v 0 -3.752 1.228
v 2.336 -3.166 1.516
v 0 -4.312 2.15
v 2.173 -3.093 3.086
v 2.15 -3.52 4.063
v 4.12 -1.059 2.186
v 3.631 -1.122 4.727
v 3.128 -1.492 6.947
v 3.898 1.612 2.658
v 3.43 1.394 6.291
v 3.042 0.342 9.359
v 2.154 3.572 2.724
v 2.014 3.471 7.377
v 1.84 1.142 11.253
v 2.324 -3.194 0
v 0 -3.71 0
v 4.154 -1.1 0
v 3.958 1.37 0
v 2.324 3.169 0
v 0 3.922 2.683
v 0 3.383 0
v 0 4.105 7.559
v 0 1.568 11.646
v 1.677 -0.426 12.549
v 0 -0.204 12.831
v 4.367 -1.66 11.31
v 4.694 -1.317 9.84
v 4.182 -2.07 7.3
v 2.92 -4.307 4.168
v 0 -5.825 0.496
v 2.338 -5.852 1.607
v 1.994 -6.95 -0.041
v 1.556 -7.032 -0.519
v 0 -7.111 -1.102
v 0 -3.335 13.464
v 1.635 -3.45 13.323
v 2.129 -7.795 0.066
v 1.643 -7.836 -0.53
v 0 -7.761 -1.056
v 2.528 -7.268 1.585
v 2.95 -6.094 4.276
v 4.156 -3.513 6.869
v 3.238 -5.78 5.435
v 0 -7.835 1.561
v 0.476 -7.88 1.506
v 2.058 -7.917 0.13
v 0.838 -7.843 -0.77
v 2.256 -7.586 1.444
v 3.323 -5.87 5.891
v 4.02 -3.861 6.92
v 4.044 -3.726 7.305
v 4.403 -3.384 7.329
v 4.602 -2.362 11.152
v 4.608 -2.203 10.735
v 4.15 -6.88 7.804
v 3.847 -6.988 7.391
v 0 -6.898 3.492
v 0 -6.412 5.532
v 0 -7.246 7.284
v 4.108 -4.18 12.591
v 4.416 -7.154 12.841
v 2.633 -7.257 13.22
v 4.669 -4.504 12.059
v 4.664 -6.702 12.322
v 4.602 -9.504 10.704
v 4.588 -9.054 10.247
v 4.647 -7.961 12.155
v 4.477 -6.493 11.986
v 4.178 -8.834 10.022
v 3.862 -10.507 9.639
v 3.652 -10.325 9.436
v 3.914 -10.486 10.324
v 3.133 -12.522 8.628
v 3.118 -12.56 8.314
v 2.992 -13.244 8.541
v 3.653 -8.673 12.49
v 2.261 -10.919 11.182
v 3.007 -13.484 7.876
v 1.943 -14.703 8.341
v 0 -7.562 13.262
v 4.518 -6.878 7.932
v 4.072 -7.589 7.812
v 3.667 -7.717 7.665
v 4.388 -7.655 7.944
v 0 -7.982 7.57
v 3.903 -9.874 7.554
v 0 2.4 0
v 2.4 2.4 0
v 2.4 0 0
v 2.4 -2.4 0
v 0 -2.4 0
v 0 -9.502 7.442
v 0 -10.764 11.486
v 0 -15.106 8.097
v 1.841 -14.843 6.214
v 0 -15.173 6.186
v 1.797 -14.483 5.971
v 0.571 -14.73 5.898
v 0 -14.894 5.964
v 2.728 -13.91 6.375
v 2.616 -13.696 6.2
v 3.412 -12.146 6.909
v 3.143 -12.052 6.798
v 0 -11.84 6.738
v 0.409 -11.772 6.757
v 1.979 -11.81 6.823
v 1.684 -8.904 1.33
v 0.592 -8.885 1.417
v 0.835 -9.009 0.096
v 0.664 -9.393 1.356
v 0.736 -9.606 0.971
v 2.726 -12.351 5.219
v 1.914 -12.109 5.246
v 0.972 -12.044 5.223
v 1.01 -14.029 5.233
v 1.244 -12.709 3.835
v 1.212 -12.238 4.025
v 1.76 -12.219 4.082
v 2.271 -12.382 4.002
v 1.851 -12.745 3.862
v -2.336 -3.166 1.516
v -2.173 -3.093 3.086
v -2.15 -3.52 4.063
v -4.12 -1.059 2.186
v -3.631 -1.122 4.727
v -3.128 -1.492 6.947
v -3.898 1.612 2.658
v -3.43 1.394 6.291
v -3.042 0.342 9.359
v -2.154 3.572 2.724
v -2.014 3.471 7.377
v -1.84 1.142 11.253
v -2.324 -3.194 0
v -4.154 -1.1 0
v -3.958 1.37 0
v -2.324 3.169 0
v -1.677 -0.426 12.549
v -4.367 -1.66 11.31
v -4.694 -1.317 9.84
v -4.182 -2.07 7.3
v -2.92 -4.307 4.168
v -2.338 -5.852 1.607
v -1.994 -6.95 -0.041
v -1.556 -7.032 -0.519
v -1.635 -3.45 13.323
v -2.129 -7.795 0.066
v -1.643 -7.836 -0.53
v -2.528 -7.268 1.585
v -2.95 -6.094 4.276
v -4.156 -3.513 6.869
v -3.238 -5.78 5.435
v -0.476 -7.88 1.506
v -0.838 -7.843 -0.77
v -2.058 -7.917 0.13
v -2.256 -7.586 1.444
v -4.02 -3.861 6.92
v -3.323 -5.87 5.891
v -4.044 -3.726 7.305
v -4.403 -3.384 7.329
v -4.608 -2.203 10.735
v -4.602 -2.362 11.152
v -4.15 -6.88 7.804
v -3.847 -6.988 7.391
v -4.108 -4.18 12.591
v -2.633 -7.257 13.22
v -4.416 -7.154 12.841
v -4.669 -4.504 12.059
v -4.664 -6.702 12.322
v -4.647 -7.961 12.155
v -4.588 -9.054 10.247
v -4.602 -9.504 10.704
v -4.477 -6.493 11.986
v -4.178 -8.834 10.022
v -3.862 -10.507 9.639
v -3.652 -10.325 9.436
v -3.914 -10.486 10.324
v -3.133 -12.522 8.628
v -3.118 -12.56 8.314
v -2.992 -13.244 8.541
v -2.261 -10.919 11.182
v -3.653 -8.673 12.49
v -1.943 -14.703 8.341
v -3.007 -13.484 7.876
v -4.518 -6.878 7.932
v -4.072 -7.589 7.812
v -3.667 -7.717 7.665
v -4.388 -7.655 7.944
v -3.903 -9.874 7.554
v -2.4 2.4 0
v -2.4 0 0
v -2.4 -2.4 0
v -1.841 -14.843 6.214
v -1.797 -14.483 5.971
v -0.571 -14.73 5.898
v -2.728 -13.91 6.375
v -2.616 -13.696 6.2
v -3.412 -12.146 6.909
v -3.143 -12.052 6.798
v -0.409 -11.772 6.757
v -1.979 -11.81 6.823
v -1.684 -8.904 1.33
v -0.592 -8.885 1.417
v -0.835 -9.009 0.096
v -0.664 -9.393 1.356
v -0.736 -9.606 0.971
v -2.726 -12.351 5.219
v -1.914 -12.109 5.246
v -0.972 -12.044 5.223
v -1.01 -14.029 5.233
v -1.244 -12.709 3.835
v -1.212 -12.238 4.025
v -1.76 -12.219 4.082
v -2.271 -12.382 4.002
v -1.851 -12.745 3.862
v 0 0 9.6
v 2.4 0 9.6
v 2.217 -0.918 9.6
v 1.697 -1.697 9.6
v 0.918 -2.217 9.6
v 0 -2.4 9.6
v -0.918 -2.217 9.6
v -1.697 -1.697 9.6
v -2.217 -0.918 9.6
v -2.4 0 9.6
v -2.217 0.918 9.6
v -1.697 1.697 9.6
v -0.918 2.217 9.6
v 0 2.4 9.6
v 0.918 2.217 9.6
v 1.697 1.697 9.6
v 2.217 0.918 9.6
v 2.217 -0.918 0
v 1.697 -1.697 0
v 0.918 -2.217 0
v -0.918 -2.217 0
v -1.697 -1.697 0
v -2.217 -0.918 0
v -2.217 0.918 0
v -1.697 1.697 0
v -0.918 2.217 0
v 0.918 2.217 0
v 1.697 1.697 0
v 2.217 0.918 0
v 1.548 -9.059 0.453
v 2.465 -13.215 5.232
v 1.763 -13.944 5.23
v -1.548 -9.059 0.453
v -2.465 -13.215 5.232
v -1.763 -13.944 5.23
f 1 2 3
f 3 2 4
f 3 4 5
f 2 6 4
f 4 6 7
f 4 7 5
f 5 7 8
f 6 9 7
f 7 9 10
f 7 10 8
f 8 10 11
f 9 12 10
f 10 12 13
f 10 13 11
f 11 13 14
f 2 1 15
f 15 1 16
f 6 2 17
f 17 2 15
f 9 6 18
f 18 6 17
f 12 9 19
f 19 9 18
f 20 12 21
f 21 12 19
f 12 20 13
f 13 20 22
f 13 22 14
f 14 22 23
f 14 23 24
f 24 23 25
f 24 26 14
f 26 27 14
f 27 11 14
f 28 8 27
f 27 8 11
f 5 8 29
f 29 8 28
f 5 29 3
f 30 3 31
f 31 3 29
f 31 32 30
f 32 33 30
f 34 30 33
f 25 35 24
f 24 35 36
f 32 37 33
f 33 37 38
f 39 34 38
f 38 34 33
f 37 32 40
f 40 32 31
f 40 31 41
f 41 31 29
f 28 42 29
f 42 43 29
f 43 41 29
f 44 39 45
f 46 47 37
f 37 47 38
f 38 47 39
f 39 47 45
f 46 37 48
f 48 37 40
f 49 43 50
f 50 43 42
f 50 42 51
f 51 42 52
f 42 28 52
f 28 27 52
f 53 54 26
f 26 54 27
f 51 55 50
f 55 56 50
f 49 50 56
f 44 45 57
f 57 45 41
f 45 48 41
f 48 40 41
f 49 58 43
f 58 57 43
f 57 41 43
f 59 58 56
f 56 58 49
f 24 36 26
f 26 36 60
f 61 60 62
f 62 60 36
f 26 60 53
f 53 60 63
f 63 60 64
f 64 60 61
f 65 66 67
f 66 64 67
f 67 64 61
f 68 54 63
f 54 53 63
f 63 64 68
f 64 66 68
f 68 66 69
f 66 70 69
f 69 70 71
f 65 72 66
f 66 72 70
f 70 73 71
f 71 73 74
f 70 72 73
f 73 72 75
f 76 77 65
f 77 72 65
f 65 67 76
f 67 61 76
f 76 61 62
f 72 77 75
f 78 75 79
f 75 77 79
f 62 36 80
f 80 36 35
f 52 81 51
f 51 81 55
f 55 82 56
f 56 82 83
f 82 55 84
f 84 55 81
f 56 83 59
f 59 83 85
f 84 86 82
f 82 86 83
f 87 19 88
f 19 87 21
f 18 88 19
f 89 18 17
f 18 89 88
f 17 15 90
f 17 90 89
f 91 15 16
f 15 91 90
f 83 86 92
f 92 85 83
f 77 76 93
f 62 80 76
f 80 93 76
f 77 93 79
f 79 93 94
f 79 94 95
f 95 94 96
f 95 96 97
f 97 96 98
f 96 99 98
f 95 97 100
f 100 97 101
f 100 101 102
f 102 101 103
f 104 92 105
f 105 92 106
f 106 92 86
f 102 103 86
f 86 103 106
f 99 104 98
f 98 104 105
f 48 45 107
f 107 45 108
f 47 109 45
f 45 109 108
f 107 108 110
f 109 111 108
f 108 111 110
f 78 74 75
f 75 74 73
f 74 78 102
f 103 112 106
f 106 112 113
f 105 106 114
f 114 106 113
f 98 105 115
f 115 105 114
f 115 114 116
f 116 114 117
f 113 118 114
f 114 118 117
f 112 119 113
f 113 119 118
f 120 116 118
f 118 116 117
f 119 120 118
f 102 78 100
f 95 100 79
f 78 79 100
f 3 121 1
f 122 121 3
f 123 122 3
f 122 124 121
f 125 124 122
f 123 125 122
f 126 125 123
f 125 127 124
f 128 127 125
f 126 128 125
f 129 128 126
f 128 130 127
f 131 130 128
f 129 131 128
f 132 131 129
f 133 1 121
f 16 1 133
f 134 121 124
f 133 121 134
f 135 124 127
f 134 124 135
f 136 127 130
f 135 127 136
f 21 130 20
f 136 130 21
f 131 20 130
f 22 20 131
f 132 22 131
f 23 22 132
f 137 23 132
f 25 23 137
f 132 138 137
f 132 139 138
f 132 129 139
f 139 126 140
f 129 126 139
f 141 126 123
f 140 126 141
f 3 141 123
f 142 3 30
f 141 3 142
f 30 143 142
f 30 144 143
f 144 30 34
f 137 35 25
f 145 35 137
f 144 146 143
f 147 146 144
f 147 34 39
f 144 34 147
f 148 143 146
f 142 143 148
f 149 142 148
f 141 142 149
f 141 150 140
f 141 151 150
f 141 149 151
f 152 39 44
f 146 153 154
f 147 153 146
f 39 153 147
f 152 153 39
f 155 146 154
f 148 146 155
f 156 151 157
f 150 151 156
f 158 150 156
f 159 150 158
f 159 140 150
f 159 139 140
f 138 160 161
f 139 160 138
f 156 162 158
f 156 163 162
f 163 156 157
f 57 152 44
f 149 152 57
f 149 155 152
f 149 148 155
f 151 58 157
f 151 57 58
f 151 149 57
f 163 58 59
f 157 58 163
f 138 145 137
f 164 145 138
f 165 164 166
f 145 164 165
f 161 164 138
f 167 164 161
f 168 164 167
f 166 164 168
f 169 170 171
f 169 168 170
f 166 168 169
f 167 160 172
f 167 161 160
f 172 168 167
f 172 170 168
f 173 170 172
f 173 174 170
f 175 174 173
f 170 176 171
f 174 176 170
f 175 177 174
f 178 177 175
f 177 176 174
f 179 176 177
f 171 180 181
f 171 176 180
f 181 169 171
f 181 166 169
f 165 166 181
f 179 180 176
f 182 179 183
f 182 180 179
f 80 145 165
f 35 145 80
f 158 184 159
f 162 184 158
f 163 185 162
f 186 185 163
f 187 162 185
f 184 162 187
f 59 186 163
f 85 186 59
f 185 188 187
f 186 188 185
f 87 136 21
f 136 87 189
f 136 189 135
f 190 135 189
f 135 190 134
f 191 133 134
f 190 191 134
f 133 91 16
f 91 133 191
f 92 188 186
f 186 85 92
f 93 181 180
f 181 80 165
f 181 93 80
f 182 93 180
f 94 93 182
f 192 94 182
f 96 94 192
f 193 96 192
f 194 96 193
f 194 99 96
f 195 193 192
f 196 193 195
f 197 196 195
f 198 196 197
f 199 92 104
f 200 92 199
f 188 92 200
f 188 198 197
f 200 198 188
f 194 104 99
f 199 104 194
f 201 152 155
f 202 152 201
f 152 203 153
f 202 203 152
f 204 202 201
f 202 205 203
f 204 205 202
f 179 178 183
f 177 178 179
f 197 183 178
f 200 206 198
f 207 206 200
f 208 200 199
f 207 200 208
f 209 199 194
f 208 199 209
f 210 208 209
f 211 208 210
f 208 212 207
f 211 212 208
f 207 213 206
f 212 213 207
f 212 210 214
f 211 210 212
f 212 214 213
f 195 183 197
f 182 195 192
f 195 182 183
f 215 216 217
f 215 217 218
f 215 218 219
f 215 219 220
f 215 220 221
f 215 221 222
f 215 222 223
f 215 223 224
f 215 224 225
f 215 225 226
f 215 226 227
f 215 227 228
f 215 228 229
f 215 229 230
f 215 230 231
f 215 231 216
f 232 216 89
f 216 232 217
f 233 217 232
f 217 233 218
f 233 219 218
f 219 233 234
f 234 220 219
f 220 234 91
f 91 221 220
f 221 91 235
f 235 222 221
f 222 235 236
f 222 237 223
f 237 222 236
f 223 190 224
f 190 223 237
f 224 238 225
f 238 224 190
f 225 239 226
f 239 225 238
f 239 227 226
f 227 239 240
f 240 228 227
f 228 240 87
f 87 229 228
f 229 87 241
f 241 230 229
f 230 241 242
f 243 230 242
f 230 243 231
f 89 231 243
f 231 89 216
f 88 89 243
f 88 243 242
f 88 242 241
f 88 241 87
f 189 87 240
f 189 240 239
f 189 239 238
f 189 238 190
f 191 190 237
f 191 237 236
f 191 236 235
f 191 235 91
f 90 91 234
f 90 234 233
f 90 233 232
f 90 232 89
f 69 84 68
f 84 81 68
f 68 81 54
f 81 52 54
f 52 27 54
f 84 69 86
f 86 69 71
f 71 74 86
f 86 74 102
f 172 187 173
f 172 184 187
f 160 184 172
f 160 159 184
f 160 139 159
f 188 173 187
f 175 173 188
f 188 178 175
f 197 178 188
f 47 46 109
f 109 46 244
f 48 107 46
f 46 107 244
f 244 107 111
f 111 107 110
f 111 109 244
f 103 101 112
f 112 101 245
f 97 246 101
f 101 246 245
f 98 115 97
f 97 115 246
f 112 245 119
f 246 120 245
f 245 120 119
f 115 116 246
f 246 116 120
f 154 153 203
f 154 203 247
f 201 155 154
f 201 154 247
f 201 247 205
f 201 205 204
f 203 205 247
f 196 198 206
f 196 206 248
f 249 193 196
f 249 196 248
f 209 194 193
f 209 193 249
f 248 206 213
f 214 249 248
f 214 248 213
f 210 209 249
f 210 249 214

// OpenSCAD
use <../lib.scad>
use <s/18955s00.scad>
use <s/18955s02.scad>
use <s/18955s03.scad>
function ldraw_lib__18955() = [
// 0 Minifig Head Snake with Open Mouth
// 0 Name: 18955.dat
// 0 Author: Jeff Jones [notmaster]
// 0 !LDRAW_ORG Part UPDATE 2025-11
// 0 !LICENSE Licensed under CC BY 4.0 : see CAreadme.txt
// 
// 0 BFC CERTIFY CCW
  [0,"BFC","CERTIFY"],
  [0,"BFC","CCW"],
// 
// 0 !KEYWORDS Anacondrai, Bricklink bb0662, Ninjago, Rebrickable 19136, serpentine
// 
// 0 !HISTORY 2016-03-18 {LEGO Digital Designer} Original part shape
// 0 !HISTORY 2025-01-25 [notmaster] File preparation for LDraw Parts Tracker
// 0 !HISTORY 2025-11-30 [OrionP] Official Update 2025-11
// 
// 1 16 0 0 0 1 0 0 0 1 0 0 0 1 s\18955s00.dat
  [1,16,0,0,0,1,0,0,0,1,0,0,0,1, ldraw_lib__s__18955s00()],
// 1 16 0 0 0 1 0 0 0 1 0 0 0 1 s\18955s02.dat
  [1,16,0,0,0,1,0,0,0,1,0,0,0,1, ldraw_lib__s__18955s02()],
// 1 16 0 0 0 -1 0 0 0 1 0 0 0 1 s\18955s02.dat
  [1,16,0,0,0,-1,0,0,0,1,0,0,0,1, ldraw_lib__s__18955s02()],
// 1 16 0 0 0 1 0 0 0 1 0 0 0 1 s\18955s03.dat
  [1,16,0,0,0,1,0,0,0,1,0,0,0,1, ldraw_lib__s__18955s03()],
];
module ldraw_lib__18955(step=0, col=false, unit=2/5, alt=false, line=0.2, solid=!$preview)
    makepoly(ldraw_lib__18955(), step=step, col=col, unit=unit, alt=alt, line=line, solid=solid);
ldraw_lib__18955(line=0.2);
